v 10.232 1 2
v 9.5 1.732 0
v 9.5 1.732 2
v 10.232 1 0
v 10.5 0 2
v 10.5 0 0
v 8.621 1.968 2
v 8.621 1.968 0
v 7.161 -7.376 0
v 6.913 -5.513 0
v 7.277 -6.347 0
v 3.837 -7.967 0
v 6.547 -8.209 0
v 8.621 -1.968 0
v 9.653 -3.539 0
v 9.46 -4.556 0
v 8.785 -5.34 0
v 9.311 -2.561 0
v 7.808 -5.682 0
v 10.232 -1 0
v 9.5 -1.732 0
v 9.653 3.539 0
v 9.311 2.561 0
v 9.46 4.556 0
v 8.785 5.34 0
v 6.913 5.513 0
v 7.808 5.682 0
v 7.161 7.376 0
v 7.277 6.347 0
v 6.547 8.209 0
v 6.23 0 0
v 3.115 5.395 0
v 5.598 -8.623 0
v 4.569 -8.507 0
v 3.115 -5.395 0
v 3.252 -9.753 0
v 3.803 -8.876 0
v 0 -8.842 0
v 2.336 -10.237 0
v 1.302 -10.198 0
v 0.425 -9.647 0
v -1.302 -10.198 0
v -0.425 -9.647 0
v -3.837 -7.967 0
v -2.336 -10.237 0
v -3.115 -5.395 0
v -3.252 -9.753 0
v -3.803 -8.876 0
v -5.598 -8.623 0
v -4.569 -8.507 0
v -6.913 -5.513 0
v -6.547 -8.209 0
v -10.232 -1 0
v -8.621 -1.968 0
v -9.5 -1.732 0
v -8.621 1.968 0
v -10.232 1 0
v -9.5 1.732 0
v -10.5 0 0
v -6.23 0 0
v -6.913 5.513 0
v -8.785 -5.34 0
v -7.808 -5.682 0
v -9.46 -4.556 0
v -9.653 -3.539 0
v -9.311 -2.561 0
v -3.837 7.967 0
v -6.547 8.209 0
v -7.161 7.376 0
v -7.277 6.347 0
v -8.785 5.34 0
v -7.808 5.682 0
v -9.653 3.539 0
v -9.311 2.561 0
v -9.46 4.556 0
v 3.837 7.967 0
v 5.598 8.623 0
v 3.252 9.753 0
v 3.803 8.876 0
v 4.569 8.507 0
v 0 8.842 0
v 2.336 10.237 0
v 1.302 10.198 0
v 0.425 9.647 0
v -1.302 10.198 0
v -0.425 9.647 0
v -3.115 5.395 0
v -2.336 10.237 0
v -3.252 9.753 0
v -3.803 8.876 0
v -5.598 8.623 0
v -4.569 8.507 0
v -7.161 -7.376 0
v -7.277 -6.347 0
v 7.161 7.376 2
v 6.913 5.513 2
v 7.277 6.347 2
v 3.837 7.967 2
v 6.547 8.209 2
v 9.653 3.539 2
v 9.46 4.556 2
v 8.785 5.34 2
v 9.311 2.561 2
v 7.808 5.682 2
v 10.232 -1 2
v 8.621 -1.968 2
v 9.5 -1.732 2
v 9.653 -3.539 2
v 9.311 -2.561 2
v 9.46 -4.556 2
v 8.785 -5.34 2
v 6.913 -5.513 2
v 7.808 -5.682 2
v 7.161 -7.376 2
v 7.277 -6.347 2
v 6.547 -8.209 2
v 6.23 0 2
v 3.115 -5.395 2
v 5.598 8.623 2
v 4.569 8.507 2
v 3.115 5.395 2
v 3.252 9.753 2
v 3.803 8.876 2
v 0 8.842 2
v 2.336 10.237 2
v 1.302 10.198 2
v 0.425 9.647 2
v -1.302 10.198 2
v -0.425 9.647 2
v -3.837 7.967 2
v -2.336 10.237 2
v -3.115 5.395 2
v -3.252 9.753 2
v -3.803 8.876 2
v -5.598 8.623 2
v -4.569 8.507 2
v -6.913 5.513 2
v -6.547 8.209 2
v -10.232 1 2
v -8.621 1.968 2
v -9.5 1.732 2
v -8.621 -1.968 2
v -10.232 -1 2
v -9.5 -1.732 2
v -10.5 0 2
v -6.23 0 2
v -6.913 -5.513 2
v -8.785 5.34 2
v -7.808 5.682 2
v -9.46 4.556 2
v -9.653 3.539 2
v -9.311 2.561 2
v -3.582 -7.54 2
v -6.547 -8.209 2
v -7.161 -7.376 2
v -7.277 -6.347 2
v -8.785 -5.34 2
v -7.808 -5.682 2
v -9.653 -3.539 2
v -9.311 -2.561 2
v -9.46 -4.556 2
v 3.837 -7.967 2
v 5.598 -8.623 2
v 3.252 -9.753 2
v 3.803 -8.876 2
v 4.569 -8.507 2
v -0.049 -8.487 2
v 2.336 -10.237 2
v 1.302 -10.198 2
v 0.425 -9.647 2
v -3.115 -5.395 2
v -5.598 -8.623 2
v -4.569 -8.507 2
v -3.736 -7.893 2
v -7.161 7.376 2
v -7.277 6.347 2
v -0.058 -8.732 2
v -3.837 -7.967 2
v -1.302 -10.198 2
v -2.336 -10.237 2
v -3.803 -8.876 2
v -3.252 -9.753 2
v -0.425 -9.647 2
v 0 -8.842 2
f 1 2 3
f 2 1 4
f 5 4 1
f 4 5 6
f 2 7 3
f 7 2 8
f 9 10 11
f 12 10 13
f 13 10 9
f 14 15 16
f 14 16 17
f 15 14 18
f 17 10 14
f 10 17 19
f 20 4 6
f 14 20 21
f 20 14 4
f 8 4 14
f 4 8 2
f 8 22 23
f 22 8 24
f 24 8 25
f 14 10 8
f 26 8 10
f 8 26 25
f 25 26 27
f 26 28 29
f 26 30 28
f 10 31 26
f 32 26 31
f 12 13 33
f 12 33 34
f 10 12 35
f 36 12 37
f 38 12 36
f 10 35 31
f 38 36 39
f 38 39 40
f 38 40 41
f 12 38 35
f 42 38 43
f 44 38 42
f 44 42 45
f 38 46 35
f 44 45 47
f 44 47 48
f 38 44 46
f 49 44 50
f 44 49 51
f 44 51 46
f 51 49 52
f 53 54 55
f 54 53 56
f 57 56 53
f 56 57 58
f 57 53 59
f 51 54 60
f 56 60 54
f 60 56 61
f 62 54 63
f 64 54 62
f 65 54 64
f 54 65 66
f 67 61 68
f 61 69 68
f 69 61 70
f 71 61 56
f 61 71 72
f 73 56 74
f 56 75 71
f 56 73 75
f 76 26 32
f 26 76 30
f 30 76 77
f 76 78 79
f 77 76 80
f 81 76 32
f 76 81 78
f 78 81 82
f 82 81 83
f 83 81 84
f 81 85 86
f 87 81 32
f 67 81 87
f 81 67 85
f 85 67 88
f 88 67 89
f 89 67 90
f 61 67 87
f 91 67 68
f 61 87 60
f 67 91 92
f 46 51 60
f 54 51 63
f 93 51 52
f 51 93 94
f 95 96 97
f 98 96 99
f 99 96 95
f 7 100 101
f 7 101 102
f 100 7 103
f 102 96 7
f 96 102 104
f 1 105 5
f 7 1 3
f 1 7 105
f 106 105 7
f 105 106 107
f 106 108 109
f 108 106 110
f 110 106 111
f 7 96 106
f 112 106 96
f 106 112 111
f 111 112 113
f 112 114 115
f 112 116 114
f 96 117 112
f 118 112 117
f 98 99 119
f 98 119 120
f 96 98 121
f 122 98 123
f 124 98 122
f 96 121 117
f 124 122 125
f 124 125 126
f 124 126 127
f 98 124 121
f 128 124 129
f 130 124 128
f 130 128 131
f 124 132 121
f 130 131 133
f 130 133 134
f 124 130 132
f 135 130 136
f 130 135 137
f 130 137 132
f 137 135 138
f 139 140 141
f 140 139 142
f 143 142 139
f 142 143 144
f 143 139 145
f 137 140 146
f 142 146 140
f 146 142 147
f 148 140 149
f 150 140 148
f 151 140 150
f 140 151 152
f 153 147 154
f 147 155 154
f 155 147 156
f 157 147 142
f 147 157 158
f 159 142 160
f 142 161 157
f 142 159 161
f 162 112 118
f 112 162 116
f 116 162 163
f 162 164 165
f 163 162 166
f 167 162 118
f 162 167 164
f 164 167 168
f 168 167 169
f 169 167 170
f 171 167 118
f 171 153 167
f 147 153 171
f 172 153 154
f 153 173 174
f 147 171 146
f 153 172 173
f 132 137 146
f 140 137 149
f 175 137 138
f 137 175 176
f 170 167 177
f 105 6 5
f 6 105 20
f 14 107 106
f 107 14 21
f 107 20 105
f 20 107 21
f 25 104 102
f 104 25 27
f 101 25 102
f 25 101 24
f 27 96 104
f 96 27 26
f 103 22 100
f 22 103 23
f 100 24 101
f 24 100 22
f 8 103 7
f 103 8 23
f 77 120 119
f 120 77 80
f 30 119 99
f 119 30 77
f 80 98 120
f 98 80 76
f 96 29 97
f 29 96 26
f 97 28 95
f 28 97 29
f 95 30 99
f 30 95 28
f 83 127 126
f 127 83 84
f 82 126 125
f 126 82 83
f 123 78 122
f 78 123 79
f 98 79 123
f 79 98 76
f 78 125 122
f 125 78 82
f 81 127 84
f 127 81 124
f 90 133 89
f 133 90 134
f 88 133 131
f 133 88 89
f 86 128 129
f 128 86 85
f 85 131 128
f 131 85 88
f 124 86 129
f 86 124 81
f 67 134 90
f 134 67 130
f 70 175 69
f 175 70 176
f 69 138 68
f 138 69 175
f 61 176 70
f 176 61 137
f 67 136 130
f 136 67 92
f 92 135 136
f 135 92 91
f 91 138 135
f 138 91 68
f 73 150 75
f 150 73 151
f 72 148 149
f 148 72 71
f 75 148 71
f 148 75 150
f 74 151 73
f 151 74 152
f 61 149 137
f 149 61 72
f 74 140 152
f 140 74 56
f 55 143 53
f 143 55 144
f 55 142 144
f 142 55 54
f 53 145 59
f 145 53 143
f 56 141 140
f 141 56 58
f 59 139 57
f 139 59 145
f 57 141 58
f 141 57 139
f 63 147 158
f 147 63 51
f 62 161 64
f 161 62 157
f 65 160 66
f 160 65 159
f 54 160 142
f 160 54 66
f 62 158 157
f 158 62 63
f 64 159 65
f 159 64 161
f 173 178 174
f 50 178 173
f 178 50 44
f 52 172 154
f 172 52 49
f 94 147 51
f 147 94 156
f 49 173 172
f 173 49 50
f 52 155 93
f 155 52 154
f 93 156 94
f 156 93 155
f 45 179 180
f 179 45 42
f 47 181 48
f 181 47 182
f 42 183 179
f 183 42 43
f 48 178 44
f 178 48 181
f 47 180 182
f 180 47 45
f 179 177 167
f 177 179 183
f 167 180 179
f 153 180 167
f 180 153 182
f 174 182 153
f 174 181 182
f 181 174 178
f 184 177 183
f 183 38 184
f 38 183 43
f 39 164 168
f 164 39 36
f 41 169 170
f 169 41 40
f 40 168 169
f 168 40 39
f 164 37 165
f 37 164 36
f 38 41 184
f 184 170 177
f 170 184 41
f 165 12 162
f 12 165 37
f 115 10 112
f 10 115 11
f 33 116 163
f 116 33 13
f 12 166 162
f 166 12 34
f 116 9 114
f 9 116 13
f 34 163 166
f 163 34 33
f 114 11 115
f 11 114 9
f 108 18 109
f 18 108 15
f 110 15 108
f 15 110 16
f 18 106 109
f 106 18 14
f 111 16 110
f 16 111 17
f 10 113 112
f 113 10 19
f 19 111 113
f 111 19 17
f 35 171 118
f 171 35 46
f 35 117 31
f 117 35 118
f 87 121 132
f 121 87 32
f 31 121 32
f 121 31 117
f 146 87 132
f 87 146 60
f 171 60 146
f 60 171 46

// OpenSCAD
// Knob for nut
// Hari Wiguna, 2014

nutHeight = 5.54;
nutWidestDiameter = 12.46;
knobHeight = 2.0;
knobDiameter = 17.0;
ridgeHeight = knobHeight;
ridgeRadius = 2;

// Computed
nutRadius = nutWidestDiameter / 2.0;
knobRadius = knobDiameter / 2.0;

difference()
{
	union()
	{
		// Knob
		cylinder( knobHeight, knobRadius, knobRadius, $fn=12 );
	
		// Knob ridges
		for (n=[0:1:13])
		{
			rotate(n*360/14,[0,0,1])
				translate([knobRadius,0,0]) 
					cylinder( ridgeHeight, ridgeRadius, ridgeRadius, $fn=12 );
		}
	}

	// Hexagon nut
	translate([0,0,-(nutHeight-knobHeight)/2]) 
		cylinder( nutHeight, nutRadius, nutRadius, $fn=6 );
}
